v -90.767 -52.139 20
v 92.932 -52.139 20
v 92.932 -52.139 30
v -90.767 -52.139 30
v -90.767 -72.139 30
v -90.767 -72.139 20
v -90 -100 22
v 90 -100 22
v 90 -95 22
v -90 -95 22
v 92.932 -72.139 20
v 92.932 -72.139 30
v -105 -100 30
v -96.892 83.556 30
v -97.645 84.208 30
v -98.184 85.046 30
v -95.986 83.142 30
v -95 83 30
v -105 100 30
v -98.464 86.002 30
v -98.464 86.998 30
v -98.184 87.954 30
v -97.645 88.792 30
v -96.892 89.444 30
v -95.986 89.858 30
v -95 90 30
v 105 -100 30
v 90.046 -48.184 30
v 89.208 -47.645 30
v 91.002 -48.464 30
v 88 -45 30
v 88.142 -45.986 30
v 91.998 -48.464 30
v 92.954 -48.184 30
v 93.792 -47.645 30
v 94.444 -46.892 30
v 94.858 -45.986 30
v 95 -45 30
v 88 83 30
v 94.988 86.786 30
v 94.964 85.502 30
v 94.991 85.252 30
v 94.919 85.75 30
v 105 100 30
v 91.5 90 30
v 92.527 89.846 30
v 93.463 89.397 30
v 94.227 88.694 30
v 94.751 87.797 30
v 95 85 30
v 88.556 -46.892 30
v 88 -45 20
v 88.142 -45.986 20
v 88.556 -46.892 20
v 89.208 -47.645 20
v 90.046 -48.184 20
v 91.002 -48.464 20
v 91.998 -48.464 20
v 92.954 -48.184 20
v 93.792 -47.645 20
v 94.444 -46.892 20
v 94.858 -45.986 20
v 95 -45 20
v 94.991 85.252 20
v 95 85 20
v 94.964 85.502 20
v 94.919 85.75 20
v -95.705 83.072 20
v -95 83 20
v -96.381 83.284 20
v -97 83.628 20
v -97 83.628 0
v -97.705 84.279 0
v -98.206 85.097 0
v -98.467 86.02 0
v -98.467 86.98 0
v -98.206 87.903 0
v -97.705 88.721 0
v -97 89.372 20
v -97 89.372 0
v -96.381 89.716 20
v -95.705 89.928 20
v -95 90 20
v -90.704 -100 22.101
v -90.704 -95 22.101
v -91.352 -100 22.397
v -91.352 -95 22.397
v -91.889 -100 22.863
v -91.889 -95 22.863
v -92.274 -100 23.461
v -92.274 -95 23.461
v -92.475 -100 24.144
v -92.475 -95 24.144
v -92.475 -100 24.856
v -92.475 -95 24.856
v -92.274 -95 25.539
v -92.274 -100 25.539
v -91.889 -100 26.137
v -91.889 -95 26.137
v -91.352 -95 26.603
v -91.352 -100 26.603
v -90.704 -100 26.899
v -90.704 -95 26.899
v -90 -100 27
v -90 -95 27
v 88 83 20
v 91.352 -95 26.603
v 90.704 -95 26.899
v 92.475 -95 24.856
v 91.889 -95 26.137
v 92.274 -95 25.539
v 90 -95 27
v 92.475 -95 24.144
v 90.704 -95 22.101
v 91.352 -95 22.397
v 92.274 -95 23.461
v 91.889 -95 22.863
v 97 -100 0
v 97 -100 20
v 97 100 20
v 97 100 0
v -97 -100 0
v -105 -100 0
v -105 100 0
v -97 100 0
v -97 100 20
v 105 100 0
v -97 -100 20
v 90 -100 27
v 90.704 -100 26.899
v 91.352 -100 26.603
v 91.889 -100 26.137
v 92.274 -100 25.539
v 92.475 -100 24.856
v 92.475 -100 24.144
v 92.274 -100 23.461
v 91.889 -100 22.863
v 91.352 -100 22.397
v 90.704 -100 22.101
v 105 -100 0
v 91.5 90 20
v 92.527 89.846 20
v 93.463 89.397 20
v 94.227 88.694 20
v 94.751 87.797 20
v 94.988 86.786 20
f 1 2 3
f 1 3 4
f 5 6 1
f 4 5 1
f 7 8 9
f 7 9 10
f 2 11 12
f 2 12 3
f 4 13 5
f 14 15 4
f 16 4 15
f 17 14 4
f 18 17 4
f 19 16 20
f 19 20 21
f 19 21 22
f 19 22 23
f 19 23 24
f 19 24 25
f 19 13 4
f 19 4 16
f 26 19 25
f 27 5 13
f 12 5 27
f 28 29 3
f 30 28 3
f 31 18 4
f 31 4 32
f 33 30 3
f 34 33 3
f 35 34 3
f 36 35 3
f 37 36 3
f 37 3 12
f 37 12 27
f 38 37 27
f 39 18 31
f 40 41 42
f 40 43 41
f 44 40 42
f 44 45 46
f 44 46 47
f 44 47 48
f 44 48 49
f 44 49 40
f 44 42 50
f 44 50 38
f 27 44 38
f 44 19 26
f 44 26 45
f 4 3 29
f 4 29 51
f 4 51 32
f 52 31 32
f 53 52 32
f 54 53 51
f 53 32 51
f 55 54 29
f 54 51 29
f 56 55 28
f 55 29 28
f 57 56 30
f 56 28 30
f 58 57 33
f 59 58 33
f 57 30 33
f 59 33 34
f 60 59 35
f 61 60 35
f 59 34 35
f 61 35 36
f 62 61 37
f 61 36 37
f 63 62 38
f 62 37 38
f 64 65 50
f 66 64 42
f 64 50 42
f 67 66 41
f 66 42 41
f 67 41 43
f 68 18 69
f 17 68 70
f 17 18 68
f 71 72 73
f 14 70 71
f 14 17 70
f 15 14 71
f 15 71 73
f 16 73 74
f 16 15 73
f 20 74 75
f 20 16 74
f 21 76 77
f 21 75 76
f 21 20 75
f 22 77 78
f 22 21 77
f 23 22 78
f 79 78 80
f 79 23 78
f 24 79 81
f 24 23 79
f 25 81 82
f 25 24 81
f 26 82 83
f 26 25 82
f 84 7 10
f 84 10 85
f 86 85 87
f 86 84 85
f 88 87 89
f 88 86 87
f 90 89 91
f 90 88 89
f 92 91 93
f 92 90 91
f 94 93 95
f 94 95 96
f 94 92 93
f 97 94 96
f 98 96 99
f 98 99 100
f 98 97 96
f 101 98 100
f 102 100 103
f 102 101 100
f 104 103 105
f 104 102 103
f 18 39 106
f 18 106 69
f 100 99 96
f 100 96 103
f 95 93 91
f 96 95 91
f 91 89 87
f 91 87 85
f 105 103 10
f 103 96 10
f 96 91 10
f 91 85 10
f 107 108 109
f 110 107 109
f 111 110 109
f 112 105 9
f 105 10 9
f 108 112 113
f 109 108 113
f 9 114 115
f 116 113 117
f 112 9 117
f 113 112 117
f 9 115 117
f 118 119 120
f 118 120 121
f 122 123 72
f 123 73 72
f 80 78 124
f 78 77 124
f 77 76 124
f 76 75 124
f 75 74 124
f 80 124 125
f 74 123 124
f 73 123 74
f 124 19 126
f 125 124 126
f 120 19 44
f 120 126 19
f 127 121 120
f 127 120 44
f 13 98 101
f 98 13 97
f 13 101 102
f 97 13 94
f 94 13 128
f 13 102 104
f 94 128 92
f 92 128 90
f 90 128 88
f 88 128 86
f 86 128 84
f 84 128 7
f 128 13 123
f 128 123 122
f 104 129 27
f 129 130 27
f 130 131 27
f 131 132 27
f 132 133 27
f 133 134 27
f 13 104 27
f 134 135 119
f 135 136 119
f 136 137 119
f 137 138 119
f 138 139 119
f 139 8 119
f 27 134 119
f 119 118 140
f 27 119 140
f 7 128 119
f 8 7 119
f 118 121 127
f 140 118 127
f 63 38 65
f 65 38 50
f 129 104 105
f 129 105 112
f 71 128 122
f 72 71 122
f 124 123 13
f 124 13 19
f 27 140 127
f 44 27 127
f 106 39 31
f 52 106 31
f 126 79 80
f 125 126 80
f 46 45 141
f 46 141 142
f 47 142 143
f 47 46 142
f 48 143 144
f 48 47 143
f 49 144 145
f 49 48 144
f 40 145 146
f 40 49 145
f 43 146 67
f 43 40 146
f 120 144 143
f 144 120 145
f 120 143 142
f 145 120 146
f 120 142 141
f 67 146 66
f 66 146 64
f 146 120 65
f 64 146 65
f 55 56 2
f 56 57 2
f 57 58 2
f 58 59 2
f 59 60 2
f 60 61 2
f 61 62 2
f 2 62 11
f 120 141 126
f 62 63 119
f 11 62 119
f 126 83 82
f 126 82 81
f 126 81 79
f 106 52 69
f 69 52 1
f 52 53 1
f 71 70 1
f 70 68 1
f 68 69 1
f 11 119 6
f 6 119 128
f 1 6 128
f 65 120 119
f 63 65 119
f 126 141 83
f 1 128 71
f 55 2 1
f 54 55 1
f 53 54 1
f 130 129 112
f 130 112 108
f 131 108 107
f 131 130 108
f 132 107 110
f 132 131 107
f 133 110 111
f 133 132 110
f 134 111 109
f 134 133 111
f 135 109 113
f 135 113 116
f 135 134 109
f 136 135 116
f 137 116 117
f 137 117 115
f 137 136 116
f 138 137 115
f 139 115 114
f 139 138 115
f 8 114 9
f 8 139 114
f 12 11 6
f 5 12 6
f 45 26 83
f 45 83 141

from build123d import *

# Parameters (mm, degrees)
SKETCH1_W           = 210
SKETCH1_H           = 200
BOSS_EXTRUDE1_DEPTH = 30
SKETCH2_W           = 194
SKETCH2_H           = 20
CUT_EXTRUDE1_DEPTH  = 228.870577302
CUT_EXTRUDE2_DEPTH  = 149.07092895
CUT_EXTRUDE3_DEPTH  = 149.07092895
SKETCH6_W           = 183.698961066
SKETCH6_H           = 20
CUT_EXTRUDE4_DEPTH  = 147.372811683
CUT_EXTRUDE6_DEPTH  = 5


with BuildPart() as part:
    # Sketch1 → Boss-Extrude1 (new body)
    with BuildSketch(Plane.XY):
        Rectangle(SKETCH1_W, SKETCH1_H)
    extrude(amount=BOSS_EXTRUDE1_DEPTH)

    # Sketch2 → Cut-Extrude1 (cut, through all)
    with BuildSketch(Plane(origin=(0, -100, 0), x_dir=(-1, 0, 0), z_dir=(0, -1, 0))):
        with Locations((0, -10)):
            Rectangle(SKETCH2_W, SKETCH2_H)
    extrude(amount=-CUT_EXTRUDE1_DEPTH, mode=Mode.SUBTRACT)

    # Sketch3 → Cut-Extrude2 (cut, through all)
    with BuildSketch(Plane.XY.offset(30)):
        with BuildLine():
            Line((88, 85), (88, -45))
            ThreePointArc((88, -45), (91.5, -48.5), (95, -45))
            Line((95, -45), (95, 85))
            ThreePointArc((95, 85), (91.5, 88.5), (88, 85))
        make_face()
    extrude(amount=-CUT_EXTRUDE2_DEPTH, mode=Mode.SUBTRACT)

    # Sketch4 → Cut-Extrude3 (cut, through all)
    with BuildSketch(Plane.XY.offset(30)):
        with BuildLine():
            Line((91.5, 83), (-95, 83))
            ThreePointArc((-95, 83), (-98.5, 86.5), (-95, 90))
            Line((-95, 90), (91.5, 90))
            ThreePointArc((91.5, 90), (95, 86.5), (91.5, 83))
        make_face()
    extrude(amount=-CUT_EXTRUDE3_DEPTH, mode=Mode.SUBTRACT)

    # Sketch6 → Cut-Extrude4 (cut, through all)
    with BuildSketch(Plane(origin=(0, 0, 20), x_dir=(-1, 0, 0), z_dir=(0, 0, -1))):
        with Locations((-1.082669049, -62.138985898)):
            Rectangle(SKETCH6_W, SKETCH6_H)
    extrude(amount=-CUT_EXTRUDE4_DEPTH, mode=Mode.SUBTRACT)

    # Sketch5 → Cut-Extrude6 (cut)
    with BuildSketch(Plane(origin=(0, -100, 0), x_dir=(-1, 0, 0), z_dir=(0, -1, 0))):
        with BuildLine():
            Line((90, -27), (-90, -27))
            ThreePointArc((-90, -27), (-92.5, -24.5), (-90, -22))
            Line((-90, -22), (90, -22))
            ThreePointArc((90, -22), (92.5, -24.5), (90, -27))
        make_face()
    extrude(amount=-CUT_EXTRUDE6_DEPTH, mode=Mode.SUBTRACT)


solid = part.part
